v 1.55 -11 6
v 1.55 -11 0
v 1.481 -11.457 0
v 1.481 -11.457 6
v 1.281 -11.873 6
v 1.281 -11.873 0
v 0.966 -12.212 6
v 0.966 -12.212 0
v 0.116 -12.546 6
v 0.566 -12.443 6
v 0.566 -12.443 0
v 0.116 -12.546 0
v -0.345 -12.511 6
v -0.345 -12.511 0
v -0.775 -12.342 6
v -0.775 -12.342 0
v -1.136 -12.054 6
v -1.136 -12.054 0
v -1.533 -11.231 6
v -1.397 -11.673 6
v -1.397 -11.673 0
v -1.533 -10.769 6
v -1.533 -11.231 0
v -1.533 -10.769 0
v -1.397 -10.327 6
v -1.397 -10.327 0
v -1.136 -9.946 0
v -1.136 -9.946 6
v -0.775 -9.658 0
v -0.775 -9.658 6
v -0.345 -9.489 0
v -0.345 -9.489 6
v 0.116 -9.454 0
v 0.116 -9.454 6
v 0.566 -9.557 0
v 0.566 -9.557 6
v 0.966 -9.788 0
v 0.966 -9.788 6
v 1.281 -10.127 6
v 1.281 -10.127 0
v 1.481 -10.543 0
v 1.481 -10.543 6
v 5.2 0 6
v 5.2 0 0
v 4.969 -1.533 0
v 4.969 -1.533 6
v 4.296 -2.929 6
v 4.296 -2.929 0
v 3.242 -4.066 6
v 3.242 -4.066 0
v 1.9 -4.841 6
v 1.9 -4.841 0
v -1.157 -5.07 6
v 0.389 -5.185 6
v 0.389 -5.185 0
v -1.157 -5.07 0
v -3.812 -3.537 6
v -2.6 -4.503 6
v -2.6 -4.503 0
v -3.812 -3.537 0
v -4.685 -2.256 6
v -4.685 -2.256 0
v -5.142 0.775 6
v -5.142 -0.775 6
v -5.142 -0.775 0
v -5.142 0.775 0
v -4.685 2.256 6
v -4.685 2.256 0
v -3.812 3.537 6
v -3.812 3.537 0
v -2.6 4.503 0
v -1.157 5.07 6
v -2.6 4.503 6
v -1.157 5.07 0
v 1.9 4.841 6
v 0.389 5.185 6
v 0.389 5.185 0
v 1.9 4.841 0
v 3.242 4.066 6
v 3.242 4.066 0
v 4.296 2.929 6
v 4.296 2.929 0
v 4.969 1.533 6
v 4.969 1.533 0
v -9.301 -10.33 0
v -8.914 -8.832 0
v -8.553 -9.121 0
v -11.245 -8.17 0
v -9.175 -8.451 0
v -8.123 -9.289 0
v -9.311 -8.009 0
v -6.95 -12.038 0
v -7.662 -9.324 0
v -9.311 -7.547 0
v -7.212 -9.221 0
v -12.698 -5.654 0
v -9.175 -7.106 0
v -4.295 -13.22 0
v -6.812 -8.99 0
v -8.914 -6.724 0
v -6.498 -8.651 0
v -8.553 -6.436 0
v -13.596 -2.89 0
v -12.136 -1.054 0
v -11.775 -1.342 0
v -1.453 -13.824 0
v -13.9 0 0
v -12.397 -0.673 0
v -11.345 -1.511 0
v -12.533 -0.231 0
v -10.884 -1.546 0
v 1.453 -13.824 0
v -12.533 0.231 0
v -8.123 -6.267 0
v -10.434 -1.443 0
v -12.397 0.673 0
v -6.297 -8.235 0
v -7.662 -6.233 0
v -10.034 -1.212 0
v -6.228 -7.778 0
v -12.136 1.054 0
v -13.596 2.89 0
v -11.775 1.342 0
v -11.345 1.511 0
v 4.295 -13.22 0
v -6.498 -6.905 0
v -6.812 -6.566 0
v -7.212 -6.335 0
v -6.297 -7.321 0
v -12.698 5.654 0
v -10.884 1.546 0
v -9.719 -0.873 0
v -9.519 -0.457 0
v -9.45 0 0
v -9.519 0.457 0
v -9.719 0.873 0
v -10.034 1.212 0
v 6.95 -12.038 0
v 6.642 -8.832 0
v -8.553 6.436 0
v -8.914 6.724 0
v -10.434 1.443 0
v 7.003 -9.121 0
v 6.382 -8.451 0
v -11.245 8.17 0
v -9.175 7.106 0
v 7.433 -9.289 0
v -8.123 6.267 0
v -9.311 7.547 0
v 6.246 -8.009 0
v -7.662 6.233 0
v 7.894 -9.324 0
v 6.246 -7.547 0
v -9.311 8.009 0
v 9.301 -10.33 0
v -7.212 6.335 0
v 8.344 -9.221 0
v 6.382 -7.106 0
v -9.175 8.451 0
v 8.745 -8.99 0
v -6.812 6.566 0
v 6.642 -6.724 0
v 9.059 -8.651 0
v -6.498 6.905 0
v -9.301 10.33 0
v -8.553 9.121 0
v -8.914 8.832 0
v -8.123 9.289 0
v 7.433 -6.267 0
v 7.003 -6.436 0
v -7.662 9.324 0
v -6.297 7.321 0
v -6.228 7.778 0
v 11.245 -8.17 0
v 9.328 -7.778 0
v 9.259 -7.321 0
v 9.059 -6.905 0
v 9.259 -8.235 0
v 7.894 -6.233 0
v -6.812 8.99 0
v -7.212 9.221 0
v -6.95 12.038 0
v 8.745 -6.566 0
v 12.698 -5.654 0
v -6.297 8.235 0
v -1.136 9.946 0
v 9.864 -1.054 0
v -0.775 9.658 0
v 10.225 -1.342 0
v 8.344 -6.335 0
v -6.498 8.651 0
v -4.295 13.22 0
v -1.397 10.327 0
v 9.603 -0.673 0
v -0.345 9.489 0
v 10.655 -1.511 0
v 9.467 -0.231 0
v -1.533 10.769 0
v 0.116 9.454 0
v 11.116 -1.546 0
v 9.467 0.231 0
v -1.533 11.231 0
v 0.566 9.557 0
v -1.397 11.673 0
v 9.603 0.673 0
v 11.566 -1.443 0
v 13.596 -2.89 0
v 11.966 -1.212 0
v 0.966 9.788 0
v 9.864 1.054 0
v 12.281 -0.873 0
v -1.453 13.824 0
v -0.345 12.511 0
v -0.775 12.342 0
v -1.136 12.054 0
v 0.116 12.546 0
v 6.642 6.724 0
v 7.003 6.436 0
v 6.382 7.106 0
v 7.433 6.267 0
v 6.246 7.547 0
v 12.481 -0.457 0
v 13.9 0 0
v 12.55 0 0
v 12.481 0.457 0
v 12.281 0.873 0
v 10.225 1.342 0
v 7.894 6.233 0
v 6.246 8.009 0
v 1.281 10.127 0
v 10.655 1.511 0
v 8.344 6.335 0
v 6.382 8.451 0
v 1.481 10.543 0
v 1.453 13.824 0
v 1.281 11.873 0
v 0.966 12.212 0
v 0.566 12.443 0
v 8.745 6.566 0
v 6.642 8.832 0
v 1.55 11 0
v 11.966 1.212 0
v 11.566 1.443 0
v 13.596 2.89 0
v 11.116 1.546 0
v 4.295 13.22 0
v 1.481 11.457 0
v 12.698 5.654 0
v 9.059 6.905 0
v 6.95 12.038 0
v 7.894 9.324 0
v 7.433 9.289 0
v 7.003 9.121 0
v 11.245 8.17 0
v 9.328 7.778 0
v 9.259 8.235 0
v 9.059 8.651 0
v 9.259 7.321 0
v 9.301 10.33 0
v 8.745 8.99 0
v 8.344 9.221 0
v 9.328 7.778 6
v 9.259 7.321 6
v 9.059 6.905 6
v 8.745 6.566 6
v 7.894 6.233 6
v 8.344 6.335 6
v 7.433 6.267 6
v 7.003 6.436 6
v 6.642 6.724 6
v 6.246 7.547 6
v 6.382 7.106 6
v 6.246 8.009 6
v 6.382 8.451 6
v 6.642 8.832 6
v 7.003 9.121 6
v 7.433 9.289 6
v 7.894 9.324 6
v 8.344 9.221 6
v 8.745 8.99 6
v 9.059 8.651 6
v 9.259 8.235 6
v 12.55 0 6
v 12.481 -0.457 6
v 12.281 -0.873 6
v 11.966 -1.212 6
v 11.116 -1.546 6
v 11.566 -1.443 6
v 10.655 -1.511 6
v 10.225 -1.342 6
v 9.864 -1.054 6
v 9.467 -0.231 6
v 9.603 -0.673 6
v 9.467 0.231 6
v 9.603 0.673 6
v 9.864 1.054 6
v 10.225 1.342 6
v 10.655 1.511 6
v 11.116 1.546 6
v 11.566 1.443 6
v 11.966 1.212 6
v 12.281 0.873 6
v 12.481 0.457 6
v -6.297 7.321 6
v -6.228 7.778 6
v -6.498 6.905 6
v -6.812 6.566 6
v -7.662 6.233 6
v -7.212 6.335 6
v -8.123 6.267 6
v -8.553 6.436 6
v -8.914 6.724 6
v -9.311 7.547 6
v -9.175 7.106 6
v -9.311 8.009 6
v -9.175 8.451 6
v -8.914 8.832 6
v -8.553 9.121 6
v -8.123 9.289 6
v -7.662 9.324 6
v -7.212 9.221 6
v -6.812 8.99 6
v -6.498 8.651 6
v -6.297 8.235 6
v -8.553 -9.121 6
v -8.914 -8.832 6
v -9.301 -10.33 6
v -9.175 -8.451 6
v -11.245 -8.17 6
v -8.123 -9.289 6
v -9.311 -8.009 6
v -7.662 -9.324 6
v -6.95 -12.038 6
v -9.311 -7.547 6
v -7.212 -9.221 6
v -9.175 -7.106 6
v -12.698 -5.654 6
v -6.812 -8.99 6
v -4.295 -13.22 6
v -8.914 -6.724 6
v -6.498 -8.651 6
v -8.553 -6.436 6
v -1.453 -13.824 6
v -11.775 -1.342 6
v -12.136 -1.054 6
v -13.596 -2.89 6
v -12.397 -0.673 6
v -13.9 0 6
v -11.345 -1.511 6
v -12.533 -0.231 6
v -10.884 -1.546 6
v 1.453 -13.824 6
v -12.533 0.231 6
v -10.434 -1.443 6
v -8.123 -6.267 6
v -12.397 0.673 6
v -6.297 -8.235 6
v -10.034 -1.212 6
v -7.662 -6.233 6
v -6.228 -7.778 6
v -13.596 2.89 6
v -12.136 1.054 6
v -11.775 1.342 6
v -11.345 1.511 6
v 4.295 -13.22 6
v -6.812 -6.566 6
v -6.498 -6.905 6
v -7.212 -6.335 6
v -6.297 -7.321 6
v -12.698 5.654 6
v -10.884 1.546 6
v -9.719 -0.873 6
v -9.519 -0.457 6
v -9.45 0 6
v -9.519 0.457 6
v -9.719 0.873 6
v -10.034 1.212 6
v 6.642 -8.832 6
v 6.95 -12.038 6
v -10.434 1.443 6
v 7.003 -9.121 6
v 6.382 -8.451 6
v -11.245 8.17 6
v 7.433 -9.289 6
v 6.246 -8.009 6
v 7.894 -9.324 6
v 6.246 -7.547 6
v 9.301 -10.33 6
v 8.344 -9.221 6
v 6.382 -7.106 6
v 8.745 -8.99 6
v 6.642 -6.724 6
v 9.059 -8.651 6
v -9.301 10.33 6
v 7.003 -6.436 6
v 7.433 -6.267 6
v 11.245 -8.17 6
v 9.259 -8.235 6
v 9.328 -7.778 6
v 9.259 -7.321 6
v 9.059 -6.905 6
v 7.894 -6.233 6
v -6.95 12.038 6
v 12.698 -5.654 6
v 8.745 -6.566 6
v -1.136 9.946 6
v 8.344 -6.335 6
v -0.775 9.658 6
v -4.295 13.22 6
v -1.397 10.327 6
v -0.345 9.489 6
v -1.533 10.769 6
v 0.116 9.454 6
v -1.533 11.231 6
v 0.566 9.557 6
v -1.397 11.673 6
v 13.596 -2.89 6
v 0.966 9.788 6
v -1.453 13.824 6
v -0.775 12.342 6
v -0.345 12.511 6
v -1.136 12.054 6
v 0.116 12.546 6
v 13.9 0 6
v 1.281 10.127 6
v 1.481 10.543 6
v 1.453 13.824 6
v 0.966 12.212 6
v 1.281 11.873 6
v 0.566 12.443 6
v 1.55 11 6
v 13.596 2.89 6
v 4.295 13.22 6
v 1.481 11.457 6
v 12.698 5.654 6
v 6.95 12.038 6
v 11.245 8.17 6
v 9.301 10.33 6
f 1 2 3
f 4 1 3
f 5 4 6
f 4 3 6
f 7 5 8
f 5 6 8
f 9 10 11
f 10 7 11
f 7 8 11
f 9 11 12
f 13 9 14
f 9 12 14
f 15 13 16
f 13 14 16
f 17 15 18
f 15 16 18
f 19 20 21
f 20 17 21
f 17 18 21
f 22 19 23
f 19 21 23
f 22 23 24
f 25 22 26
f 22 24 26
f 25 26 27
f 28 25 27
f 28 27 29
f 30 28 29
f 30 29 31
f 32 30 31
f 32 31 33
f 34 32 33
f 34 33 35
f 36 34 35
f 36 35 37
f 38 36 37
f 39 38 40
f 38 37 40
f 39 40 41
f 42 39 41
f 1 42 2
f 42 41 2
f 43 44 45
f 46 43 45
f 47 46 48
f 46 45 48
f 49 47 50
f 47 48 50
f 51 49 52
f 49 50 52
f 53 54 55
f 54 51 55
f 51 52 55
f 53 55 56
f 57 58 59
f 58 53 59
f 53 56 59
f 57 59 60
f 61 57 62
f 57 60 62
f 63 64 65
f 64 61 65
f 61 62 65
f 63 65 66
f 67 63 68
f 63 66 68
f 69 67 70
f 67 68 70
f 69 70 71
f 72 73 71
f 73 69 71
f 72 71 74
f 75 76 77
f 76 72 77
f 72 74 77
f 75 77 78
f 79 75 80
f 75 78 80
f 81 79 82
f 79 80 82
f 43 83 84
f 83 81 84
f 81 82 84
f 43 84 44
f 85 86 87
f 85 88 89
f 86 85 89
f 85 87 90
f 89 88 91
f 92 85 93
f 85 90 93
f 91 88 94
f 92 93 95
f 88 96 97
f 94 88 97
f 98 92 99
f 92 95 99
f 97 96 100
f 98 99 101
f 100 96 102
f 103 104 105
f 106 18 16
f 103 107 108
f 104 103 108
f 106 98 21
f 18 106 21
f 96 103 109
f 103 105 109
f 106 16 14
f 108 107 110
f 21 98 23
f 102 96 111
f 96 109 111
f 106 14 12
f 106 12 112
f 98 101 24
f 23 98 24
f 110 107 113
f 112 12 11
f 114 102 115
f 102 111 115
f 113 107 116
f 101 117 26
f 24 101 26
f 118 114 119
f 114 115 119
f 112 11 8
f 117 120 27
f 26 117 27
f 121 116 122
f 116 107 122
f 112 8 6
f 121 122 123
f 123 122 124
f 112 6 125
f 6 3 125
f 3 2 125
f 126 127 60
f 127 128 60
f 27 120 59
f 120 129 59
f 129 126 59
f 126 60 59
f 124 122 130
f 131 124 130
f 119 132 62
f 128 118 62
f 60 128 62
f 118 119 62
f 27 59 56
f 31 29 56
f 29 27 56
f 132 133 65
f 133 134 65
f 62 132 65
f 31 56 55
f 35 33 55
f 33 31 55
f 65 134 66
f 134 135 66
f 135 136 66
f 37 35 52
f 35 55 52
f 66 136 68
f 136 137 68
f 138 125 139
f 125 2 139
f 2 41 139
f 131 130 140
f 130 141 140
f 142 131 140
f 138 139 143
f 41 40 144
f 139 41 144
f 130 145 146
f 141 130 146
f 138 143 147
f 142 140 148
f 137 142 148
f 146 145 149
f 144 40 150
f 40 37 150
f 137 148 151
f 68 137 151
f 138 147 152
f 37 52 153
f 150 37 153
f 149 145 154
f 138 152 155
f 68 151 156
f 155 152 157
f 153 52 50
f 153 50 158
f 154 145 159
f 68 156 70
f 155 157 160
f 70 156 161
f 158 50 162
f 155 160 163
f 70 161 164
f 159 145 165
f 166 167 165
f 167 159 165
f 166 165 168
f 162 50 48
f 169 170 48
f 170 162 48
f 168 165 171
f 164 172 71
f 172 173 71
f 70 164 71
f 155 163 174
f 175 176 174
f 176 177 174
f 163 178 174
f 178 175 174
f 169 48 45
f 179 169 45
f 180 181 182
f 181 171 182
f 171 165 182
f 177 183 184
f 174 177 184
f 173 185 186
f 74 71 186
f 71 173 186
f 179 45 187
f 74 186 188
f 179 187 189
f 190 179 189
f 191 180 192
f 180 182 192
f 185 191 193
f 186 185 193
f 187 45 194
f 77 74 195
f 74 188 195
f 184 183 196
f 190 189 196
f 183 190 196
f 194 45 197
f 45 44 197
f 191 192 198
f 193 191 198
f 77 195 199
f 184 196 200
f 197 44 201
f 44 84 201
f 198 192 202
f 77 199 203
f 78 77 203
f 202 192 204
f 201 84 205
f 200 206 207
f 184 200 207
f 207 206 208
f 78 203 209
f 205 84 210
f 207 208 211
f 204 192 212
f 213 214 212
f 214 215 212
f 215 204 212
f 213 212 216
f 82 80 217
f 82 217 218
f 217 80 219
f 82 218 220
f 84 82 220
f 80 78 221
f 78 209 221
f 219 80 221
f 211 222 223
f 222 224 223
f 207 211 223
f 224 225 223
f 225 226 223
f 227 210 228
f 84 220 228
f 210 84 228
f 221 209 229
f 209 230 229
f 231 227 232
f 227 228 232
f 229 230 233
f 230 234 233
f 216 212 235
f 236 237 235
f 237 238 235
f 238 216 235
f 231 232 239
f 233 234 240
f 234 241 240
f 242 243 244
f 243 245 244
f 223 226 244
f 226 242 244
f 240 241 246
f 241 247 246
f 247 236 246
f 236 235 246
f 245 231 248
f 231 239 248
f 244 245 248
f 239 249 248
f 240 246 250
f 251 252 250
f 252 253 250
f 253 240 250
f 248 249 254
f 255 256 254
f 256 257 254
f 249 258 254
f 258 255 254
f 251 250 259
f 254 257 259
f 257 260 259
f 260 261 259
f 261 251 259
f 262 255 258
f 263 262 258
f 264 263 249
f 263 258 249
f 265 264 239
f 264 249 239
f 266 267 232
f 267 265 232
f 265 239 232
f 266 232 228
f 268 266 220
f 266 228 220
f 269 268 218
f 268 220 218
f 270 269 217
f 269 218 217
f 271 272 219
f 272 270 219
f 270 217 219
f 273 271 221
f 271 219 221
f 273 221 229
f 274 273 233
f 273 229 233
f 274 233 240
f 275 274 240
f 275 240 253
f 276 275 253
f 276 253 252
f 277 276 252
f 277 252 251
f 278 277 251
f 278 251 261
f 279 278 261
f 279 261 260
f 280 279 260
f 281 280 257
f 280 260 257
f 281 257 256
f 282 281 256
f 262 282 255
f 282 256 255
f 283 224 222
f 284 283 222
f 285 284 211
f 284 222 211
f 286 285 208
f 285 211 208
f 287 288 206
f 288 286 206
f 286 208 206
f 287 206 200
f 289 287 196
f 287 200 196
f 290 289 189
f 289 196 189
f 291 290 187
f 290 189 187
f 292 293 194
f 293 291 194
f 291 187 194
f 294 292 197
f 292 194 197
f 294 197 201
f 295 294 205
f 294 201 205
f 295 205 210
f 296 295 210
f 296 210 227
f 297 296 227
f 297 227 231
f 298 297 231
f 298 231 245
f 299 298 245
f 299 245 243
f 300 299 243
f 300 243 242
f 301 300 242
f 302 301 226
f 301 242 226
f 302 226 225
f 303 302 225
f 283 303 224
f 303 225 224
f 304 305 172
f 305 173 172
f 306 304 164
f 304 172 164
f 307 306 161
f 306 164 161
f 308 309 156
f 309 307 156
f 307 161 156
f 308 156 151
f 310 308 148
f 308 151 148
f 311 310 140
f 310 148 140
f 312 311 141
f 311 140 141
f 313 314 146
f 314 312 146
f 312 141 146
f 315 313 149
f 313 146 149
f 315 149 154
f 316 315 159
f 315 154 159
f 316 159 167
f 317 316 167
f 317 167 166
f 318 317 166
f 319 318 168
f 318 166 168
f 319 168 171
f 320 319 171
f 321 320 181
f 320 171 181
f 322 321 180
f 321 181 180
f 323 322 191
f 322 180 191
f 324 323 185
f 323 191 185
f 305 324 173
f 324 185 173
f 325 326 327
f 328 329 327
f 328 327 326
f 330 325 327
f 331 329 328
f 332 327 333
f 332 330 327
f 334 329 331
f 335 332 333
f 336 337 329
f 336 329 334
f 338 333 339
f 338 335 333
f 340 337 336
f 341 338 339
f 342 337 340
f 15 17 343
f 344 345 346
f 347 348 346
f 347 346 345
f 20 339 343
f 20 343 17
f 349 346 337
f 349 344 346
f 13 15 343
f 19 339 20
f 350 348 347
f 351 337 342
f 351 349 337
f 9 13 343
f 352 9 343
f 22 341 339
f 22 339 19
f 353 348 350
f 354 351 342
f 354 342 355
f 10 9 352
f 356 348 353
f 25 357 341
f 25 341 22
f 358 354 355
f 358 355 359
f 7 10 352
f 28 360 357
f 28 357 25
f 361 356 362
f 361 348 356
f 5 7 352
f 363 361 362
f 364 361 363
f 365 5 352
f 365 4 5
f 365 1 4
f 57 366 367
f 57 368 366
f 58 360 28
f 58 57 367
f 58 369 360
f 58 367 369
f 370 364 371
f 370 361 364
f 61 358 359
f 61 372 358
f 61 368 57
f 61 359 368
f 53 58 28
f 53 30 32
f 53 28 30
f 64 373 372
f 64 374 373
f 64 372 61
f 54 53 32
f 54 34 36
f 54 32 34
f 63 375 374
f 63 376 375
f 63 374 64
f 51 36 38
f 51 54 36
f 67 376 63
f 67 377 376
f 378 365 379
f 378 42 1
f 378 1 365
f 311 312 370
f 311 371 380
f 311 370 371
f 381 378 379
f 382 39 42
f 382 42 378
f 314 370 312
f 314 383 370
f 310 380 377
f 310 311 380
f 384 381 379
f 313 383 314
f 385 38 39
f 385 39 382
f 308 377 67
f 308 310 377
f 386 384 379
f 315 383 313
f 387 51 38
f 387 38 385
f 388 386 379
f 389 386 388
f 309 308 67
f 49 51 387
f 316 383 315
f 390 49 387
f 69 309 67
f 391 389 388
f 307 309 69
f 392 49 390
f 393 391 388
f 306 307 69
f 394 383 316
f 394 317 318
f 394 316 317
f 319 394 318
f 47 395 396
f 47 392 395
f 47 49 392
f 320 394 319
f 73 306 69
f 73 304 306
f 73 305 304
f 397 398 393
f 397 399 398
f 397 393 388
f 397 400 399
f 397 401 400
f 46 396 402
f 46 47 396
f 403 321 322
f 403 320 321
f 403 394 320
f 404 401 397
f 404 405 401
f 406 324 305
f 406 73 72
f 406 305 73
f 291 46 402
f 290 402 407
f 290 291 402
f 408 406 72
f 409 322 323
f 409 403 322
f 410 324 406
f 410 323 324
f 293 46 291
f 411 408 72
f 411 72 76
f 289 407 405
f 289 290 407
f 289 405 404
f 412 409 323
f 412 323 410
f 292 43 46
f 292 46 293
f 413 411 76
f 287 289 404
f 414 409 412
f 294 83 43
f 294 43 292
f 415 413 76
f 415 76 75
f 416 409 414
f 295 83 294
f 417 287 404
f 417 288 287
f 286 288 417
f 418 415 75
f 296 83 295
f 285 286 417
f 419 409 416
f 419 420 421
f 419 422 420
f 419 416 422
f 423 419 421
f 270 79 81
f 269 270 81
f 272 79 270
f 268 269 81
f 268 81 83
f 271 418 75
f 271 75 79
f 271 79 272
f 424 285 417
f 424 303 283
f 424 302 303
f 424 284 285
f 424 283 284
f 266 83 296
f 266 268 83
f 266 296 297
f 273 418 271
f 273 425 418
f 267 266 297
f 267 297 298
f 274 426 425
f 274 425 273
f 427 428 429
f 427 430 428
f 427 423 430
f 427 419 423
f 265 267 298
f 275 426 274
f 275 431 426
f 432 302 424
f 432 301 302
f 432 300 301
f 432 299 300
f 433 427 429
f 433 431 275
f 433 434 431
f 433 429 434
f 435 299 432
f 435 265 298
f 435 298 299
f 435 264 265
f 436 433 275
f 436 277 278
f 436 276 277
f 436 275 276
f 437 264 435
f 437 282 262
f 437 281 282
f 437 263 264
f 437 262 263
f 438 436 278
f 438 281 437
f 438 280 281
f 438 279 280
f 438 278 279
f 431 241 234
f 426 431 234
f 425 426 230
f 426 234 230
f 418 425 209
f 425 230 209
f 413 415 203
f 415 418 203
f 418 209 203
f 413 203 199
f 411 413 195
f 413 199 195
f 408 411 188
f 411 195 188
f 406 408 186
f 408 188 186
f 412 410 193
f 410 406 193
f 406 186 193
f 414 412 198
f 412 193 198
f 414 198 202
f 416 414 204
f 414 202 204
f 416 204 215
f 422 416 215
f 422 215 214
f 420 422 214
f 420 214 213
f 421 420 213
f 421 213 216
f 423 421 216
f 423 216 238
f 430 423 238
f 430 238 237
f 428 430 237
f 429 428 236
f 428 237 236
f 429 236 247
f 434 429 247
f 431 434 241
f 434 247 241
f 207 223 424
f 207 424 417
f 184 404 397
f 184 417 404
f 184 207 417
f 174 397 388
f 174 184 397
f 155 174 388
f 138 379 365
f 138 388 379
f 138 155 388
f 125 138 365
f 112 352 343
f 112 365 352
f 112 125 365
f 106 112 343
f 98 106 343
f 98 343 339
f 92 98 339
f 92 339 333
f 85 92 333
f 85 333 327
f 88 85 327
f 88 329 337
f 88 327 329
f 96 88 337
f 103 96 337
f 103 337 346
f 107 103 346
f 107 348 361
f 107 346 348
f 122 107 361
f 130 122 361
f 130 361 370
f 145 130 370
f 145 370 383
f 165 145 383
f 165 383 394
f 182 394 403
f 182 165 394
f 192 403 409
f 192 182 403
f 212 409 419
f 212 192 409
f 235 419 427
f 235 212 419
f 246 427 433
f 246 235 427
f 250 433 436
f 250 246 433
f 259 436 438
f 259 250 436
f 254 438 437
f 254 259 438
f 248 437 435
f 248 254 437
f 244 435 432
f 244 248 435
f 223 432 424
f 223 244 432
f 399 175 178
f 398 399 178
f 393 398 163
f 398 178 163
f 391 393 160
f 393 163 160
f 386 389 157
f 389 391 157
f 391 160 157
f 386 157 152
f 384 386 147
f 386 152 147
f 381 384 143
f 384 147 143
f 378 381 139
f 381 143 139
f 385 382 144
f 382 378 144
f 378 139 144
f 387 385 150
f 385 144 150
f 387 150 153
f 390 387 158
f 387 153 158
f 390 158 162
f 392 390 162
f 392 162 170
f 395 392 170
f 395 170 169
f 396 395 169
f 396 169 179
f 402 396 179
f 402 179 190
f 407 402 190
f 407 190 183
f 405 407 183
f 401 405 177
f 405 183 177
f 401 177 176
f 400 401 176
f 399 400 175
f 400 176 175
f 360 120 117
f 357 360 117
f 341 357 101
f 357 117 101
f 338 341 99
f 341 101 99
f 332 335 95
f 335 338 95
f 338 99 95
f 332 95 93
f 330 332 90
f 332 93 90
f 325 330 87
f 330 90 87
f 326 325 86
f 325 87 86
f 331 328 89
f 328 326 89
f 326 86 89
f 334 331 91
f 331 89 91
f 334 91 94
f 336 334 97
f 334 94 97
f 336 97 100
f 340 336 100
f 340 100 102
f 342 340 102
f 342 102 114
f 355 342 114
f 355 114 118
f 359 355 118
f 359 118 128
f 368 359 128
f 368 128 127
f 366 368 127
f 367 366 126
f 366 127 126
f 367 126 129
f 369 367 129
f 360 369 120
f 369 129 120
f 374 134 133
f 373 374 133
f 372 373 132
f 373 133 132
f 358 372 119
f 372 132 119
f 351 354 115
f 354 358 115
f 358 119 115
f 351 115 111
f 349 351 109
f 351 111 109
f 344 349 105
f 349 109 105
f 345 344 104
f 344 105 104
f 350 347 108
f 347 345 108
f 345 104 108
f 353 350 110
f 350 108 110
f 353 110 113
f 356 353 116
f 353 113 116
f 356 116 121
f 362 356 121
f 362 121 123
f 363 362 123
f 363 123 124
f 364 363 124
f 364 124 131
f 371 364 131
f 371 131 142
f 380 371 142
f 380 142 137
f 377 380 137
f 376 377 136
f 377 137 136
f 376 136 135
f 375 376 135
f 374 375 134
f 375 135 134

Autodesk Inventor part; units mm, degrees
ref_plane "YZ Plane" through (0, 0, 0) normal (1, 0, 0) x (0, 1, 0)
ref_plane "XZ Plane" through (0, 0, 0) normal (0, 1, 0) x (-1, 0, 0)
ref_plane "XY Plane" through (0, 0, 0) normal (0, 0, 1) x (1, 0, 0)
ref_plane "작업 평면1" through (0, 0, 0) normal (0, 0, 1) x (1, 0, 0)
sketch "스케치1" plane through (0, 0, 0) normal (0, 0, 1) x (1, 0, 0)
  circle A0 centre (-7.7782, -7.7782) radius 1.55 projected
  circle A1 centre (7.7782, -7.7782) radius 1.55 projected
  circle A2 centre (7.7782, 7.7782) radius 1.55 projected
  circle A3 centre (-7.7782, 7.7782) radius 1.55 projected
  circle A4 centre (0, 0) radius 5 projected
  circle A5 centre (0, 0) radius 13.9 projected
  circle A6 centre (0, 11) radius 1.55 projected
  circle A7 centre (11, 0) radius 1.55 projected
  circle A8 centre (0, -11) radius 1.55 projected
  circle A9 centre (-11, 0) radius 1.55 projected
  circle A10 centre (0, 0) radius 5.2
  circle A11 centre (0, 0) radius 13.9
  circle A12 centre (11, 0) radius 1.35
  circle A13 centre (7.7782, 7.7782) radius 1.35
  circle A14 centre (0, 11) radius 1.35
  circle A15 centre (-7.7782, 7.7782) radius 1.35
  circle A16 centre (-11, 0) radius 1.35
  circle A17 centre (-7.7782, -7.7782) radius 1.35
  circle A18 centre (0, -11) radius 1.35
  circle A19 centre (7.7782, -7.7782) radius 1.35
  dimension "d0" = 0.2
  dimension "d1" = 2.7
  dimension "d4" = 360
extrude "돌출1" add sketch "스케치1" along normal blind 6 contours A5
properties part number "64horn" material "PMMA 플라스틱"
